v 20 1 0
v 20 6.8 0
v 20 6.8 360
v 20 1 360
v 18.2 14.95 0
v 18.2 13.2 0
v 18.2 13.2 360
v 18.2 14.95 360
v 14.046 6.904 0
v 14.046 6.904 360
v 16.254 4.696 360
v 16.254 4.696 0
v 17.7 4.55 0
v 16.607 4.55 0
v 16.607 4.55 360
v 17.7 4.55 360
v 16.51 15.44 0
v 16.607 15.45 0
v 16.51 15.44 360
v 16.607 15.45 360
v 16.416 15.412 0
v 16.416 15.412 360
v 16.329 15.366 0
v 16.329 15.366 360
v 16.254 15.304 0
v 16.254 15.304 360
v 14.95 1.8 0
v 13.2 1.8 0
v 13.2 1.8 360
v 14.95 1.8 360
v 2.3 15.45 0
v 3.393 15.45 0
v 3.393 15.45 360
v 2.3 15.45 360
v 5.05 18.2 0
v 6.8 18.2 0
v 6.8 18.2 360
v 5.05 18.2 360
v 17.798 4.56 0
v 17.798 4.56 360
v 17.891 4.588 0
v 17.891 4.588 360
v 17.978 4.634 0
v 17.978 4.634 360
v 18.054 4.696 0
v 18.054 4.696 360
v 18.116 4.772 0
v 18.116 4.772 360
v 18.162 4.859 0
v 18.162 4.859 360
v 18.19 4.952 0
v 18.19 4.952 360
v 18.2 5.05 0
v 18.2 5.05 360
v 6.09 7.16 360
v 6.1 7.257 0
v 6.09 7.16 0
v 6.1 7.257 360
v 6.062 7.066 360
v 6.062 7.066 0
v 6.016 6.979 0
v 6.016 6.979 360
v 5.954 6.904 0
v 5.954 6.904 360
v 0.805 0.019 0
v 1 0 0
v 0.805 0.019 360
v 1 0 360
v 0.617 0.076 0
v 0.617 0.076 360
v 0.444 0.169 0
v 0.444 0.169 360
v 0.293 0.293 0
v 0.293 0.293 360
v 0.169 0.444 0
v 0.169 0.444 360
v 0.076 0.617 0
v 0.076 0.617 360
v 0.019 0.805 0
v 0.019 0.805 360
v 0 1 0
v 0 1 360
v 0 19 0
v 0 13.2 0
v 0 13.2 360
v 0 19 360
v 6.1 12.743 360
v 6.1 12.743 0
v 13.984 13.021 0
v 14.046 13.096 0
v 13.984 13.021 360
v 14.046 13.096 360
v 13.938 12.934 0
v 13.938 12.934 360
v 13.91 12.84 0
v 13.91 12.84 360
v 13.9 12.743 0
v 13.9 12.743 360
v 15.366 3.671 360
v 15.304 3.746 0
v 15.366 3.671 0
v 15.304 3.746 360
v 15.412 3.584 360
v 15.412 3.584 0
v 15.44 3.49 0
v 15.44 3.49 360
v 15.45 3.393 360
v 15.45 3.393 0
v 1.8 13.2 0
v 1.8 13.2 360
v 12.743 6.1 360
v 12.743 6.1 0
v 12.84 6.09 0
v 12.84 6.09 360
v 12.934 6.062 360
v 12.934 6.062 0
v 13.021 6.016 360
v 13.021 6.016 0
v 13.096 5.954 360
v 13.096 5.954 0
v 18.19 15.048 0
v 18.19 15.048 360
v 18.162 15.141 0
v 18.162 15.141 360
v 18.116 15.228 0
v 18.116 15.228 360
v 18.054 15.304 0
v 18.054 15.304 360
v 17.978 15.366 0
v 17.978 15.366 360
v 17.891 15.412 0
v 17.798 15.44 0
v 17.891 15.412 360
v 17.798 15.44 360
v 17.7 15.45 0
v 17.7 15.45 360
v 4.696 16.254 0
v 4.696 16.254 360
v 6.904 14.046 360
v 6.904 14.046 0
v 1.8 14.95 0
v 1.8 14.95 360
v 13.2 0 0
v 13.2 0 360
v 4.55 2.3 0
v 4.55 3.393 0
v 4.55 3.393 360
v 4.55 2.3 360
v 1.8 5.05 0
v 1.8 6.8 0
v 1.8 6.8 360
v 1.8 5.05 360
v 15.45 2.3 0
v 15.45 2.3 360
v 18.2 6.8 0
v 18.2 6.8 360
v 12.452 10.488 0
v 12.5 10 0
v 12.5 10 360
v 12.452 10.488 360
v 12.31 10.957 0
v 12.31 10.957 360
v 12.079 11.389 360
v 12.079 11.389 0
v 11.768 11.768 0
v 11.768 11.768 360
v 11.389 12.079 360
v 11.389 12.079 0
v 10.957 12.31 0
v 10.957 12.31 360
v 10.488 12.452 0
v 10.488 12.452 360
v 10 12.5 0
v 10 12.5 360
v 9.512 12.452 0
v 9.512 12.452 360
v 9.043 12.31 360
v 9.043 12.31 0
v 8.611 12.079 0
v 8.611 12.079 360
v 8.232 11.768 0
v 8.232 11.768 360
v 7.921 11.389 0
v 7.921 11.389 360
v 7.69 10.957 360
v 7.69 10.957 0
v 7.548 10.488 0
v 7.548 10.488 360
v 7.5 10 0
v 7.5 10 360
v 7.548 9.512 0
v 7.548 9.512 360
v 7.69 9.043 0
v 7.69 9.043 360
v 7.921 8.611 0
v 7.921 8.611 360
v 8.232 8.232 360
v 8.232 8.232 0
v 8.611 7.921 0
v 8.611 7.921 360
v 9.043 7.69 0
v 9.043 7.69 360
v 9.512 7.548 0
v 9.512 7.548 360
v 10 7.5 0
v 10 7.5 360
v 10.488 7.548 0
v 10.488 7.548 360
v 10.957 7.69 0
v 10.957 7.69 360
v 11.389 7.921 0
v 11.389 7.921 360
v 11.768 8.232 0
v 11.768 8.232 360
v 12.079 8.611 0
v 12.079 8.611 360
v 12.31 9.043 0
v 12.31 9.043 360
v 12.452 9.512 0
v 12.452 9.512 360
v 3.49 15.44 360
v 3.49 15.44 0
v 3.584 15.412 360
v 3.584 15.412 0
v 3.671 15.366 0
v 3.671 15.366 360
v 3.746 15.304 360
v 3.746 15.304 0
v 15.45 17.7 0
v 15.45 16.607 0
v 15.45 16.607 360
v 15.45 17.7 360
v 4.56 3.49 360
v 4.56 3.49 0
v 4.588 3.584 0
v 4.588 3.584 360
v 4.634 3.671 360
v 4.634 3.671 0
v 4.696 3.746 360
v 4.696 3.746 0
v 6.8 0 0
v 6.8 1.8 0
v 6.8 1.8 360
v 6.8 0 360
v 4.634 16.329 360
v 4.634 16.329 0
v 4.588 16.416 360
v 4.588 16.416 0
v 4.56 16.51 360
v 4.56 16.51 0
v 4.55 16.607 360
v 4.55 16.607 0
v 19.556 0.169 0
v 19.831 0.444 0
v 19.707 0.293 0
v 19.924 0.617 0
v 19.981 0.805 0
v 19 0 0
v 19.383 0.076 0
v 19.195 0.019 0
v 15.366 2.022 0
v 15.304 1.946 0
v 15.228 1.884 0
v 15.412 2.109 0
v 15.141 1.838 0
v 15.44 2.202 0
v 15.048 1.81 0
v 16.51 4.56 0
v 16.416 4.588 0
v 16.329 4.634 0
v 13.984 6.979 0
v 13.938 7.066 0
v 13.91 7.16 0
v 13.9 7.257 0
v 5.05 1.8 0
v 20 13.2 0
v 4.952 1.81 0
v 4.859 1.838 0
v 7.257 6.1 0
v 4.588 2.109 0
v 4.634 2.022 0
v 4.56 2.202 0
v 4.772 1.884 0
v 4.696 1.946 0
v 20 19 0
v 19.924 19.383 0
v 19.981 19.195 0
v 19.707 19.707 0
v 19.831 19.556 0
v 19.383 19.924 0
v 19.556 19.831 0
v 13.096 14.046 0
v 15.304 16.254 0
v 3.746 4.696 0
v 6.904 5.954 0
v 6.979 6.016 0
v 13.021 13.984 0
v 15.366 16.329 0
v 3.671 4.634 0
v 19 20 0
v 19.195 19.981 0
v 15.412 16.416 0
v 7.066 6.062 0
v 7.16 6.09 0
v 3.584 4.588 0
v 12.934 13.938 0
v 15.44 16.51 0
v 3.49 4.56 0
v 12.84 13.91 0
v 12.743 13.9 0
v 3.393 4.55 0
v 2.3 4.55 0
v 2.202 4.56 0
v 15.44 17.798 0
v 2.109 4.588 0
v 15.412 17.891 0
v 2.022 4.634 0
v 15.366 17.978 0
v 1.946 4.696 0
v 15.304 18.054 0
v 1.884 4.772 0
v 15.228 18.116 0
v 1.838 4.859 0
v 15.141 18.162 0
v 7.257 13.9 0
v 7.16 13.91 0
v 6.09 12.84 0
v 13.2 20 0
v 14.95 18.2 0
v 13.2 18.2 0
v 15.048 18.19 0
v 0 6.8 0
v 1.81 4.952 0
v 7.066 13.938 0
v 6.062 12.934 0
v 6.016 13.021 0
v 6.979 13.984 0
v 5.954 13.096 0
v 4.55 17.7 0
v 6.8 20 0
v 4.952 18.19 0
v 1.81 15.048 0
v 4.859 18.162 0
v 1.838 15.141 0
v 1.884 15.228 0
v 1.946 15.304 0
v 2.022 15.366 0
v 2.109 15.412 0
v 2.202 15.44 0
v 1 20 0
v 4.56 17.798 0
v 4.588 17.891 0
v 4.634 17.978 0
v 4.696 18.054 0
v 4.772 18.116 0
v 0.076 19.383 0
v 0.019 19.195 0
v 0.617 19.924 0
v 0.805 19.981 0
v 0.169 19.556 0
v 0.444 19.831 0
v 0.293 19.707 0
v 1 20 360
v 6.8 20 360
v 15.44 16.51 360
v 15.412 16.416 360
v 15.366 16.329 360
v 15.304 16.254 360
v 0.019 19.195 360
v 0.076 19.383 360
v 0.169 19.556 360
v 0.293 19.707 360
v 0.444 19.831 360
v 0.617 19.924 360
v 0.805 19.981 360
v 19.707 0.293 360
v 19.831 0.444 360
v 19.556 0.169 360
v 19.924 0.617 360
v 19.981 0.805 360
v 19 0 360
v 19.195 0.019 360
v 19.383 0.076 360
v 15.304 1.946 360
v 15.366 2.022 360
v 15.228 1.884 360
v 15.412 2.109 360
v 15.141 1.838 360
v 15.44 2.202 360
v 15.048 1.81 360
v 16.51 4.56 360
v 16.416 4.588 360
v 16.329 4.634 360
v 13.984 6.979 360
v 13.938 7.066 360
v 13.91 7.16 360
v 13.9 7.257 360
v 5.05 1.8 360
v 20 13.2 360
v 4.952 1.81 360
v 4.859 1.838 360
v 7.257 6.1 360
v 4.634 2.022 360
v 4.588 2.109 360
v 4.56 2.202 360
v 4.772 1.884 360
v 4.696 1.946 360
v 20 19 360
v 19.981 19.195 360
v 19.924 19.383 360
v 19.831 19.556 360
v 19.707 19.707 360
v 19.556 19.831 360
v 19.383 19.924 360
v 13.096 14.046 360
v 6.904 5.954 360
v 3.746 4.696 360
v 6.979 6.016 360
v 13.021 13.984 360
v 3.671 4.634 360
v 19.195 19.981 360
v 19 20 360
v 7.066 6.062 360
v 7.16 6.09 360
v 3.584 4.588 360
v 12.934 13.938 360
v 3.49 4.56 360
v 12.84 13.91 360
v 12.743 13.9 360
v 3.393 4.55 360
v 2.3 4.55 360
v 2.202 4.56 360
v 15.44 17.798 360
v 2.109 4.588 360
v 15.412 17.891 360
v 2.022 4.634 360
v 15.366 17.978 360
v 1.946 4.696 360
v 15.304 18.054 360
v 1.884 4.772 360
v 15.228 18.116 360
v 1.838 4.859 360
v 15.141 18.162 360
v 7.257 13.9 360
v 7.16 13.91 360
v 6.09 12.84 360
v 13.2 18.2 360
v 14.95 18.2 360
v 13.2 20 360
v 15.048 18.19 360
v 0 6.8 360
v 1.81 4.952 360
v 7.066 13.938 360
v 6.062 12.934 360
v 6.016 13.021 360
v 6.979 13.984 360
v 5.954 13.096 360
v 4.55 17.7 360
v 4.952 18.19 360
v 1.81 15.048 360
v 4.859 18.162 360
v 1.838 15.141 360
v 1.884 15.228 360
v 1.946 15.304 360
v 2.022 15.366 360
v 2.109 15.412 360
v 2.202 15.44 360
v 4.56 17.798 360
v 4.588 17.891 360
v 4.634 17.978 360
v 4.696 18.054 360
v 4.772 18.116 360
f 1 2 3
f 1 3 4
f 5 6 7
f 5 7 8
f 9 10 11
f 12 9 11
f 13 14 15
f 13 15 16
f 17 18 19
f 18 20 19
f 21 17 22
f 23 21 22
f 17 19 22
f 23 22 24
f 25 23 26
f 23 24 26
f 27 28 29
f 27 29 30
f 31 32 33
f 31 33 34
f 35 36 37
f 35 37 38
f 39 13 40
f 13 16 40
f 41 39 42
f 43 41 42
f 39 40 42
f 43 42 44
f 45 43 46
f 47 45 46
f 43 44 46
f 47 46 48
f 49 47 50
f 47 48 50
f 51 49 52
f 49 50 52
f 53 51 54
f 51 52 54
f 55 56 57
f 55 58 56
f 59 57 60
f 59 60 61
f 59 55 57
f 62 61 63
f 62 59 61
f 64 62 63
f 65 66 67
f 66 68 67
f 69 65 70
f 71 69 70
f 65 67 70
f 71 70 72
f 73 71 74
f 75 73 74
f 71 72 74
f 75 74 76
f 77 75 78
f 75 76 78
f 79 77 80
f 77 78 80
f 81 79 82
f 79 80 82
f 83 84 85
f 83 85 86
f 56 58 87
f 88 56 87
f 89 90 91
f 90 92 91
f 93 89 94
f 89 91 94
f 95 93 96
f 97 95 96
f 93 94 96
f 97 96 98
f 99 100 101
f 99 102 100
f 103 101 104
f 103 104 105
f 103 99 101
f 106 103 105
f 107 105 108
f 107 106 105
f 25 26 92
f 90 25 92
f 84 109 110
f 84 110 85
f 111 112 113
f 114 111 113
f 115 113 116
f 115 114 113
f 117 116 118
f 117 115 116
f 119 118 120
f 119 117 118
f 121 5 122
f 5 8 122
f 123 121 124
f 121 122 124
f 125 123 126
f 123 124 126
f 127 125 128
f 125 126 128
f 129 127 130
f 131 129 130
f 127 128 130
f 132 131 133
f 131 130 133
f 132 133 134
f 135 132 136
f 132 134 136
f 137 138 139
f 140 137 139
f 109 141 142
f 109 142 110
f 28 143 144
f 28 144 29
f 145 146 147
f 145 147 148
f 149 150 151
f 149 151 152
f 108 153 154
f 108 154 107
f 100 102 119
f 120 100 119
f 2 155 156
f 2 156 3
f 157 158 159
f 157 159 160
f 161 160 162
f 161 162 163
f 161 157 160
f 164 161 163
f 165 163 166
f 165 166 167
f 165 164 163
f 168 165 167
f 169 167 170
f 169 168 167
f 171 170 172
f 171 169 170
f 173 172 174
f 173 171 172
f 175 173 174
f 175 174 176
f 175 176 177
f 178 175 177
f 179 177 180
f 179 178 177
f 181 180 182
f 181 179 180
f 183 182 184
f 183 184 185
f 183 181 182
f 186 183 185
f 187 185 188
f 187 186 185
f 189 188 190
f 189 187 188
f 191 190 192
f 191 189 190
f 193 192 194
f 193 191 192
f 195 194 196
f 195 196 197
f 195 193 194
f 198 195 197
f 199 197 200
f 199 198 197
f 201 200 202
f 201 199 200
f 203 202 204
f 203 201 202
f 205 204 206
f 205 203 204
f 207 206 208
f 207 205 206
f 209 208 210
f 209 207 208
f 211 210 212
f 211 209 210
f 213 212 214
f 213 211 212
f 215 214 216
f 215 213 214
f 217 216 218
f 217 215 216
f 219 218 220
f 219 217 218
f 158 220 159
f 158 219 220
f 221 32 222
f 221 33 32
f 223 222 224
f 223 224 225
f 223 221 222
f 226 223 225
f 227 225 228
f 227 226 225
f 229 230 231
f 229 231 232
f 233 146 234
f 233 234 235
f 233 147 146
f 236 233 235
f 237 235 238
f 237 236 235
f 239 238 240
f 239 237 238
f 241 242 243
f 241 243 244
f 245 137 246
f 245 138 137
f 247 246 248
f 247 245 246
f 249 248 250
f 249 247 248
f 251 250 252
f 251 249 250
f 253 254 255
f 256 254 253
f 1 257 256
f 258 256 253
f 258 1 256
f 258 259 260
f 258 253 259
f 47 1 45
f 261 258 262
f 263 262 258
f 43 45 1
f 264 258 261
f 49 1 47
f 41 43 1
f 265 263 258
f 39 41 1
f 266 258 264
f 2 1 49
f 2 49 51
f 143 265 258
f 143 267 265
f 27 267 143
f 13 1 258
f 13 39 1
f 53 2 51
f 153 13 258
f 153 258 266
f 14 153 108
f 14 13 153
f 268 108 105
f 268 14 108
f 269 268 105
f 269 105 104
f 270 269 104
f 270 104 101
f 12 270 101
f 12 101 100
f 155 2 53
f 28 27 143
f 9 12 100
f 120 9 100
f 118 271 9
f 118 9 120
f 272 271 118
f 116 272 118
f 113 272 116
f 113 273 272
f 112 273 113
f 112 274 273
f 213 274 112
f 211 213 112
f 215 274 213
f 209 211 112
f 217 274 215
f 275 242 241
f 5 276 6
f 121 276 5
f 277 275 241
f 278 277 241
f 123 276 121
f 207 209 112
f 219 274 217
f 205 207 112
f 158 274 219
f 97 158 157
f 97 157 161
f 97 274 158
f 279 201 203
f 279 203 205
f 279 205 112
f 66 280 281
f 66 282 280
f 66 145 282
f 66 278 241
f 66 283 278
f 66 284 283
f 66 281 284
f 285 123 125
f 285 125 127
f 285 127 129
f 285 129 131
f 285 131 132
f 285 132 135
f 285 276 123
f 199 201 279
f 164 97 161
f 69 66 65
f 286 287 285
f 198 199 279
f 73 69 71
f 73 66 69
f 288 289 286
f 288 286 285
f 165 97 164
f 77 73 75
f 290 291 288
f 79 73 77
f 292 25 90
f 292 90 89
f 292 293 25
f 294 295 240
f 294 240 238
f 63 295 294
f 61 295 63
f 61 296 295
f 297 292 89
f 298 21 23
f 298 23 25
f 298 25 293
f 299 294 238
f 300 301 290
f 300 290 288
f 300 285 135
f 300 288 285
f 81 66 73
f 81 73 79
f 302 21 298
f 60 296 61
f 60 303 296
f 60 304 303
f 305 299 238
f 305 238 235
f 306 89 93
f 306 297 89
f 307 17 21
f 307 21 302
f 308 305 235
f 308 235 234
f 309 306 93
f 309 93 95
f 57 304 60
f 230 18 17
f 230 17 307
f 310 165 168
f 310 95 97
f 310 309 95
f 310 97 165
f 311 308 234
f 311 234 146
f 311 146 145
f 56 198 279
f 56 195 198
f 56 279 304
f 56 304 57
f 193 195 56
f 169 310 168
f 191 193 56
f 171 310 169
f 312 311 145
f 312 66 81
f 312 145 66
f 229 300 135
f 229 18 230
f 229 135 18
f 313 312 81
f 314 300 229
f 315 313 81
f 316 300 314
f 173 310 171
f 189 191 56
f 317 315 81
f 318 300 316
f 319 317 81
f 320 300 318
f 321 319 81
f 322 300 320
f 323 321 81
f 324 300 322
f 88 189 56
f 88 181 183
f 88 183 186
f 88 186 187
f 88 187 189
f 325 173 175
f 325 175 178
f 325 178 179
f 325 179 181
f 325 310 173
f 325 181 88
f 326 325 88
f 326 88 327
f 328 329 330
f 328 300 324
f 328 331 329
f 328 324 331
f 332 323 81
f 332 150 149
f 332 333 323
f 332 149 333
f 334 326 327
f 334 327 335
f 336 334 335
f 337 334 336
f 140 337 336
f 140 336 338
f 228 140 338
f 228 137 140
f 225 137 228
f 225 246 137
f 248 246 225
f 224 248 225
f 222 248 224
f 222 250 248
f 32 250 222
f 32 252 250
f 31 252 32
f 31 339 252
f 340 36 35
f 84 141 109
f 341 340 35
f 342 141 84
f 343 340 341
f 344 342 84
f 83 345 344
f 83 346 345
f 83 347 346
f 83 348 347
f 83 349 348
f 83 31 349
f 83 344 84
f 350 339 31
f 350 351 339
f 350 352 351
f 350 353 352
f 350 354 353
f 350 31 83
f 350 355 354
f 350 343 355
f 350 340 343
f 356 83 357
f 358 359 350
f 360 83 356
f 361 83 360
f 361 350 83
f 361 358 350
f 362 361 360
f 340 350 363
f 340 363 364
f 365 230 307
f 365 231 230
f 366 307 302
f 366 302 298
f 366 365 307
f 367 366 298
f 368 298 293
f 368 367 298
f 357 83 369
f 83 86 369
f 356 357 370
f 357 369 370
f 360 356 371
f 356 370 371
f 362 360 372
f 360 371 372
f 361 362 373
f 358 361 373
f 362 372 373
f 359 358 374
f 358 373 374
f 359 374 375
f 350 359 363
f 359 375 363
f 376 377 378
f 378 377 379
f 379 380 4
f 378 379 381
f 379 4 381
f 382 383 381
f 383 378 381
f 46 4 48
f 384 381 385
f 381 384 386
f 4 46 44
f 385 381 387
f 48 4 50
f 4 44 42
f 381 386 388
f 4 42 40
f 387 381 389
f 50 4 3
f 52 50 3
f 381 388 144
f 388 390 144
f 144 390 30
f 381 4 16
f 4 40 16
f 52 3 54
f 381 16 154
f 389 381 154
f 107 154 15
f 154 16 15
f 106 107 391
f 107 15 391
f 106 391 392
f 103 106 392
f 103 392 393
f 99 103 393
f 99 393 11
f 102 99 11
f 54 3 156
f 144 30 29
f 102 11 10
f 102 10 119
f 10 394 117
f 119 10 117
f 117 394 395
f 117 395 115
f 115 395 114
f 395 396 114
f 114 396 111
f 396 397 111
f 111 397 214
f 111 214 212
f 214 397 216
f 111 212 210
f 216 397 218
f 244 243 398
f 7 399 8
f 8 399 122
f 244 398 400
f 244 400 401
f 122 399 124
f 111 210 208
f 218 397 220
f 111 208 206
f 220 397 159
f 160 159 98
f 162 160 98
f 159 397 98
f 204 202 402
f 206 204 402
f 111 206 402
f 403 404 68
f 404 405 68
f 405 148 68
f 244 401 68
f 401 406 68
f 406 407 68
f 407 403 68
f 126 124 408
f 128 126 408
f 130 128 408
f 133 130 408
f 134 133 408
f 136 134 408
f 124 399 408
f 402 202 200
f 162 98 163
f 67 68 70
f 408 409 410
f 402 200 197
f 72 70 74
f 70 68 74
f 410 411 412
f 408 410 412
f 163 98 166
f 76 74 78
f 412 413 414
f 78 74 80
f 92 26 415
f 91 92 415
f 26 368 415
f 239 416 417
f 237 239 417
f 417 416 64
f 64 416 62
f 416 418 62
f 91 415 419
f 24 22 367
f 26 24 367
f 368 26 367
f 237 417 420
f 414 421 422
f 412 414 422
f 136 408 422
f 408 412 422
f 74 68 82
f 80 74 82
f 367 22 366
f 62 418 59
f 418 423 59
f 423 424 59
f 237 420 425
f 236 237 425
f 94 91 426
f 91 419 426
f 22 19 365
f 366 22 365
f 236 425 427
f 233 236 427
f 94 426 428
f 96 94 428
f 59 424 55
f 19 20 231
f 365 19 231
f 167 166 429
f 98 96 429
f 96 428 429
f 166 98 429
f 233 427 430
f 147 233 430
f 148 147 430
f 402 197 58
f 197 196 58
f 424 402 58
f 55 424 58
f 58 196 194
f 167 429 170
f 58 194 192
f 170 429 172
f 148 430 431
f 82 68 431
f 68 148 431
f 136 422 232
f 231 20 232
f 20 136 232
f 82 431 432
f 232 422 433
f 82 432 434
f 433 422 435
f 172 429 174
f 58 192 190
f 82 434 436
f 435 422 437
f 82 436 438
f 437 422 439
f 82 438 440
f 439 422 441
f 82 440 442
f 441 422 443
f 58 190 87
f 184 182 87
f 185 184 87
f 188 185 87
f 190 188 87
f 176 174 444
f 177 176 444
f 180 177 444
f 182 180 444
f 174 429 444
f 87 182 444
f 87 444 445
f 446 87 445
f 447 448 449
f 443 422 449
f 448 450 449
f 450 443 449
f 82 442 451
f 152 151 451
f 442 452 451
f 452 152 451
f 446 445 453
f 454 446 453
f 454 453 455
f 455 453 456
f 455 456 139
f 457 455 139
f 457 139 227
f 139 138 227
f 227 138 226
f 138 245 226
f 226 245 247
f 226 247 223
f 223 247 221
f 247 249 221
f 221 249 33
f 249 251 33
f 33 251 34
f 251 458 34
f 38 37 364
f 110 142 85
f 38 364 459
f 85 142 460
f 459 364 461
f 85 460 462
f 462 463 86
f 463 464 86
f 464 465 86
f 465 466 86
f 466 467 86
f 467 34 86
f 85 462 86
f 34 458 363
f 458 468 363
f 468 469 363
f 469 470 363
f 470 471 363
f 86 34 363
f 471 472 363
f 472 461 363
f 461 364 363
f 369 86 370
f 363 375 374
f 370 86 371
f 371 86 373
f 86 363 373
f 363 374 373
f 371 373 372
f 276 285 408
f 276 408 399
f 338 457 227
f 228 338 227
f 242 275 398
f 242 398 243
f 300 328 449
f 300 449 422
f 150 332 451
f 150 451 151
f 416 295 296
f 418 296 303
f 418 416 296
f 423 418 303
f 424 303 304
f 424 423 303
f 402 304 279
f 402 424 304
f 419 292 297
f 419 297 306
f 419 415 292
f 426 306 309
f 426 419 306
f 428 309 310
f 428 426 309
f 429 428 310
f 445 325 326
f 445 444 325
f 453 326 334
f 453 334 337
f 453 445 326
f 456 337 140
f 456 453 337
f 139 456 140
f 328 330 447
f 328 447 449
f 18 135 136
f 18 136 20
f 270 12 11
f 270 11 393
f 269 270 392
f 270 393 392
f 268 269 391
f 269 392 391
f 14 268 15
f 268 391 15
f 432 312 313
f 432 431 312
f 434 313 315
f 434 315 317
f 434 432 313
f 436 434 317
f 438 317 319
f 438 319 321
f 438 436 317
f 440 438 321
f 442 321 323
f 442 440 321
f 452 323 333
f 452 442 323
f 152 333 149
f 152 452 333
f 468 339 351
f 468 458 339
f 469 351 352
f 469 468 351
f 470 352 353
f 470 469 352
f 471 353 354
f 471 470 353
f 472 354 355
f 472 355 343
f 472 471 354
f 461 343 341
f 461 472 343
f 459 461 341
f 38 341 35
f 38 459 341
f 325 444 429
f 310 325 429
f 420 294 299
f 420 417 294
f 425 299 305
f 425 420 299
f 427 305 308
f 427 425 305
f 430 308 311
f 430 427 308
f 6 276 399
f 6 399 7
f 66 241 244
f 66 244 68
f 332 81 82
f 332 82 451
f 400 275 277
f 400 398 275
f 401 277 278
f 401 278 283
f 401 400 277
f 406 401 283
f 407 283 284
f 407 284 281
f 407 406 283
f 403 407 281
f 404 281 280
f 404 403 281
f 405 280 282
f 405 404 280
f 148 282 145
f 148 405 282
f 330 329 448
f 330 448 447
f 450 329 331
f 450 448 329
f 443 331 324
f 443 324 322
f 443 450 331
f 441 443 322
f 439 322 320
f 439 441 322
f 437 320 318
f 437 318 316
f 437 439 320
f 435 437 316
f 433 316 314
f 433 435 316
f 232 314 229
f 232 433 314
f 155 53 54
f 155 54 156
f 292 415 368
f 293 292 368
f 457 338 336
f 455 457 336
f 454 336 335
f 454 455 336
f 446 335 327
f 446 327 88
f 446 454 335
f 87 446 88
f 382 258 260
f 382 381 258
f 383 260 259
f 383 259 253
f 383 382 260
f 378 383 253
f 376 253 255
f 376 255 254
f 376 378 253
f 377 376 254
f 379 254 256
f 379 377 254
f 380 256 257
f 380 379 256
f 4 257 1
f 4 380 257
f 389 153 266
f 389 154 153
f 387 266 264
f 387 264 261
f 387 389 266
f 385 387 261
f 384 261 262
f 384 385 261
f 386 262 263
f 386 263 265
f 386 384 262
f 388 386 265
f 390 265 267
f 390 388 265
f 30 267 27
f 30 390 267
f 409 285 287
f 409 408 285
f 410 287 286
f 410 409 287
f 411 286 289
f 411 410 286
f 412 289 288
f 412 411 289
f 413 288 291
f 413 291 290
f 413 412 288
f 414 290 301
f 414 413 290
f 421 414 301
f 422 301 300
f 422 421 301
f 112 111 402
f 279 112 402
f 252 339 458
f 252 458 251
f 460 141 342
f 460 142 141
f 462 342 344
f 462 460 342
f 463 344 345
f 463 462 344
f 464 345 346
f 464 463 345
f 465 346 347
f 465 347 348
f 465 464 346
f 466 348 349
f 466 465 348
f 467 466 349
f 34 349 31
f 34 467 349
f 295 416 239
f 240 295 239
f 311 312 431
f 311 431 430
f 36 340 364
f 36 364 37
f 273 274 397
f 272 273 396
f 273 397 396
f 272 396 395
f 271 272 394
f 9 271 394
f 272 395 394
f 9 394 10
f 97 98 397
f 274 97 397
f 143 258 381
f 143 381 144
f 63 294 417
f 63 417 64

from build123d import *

# Parameters (mm, degrees)
SKETCH1_R           = 2.5
BOSS_EXTRUDE1_DEPTH = 360
FILLET1_R           = 1
FILLET2_R           = 0.5
FILLET3_R           = 0.5
FILLET4_R           = 0.5
FILLET5_R           = 0.5


with BuildPart() as part:
    # Sketch1 → Boss-Extrude1 (new body)
    with BuildSketch(Plane.XY):
        Polygon((13.2, 0), (13.2, 1.8), (15.45, 1.8), (15.45, 3.6), (12.95, 6.1), (7.05, 6.1), (4.55, 3.6), (4.55, 1.8), (6.8, 1.8), (6.8, 0), (0, 0), (0, 6.8), (1.8, 6.8), (1.8, 4.55), (3.6, 4.55), (6.1, 7.05), (6.1, 12.95), (3.6, 15.45), (1.8, 15.45), (1.8, 13.2), (0, 13.2), (0, 20), (6.8, 20), (6.8, 18.2), (4.55, 18.2), (4.55, 16.4), (7.05, 13.9), (12.95, 13.9), (15.45, 16.4), (15.45, 18.2), (13.2, 18.2), (13.2, 20), (20, 20), (20, 13.2), (18.2, 13.2), (18.2, 15.45), (16.4, 15.45), (13.9, 12.95), (13.9, 7.05), (16.4, 4.55), (18.2, 4.55), (18.2, 6.8), (20, 6.8), (20, 0), align=None)
        with Locations((10, 10)):
            Circle(SKETCH1_R, mode=Mode.SUBTRACT)
    extrude(amount=BOSS_EXTRUDE1_DEPTH)

    # Fillet1
    fillet1_edges = [part.edges().sort_by_distance(p)[0] for p in [
        (0, 0, 180),
        (0, 20, 180),
        (20, 20, 180),
        (20, 0, 180),
    ]]
    fillet(fillet1_edges, radius=FILLET1_R)

    # Fillet2
    fillet2_edges = [part.edges().sort_by_distance(p)[0] for p in [
        (4.55, 18.2, 180),
        (4.55, 16.4, 180),
        (7.05, 13.9, 180),
        (12.95, 13.9, 180),
        (15.45, 16.4, 180),
        (15.45, 18.2, 180),
    ]]
    fillet(fillet2_edges, radius=FILLET2_R)

    # Fillet3
    fillet3_edges = [part.edges().sort_by_distance(p)[0] for p in [
        (18.2, 15.45, 180),
        (16.4, 15.45, 180),
        (13.9, 12.95, 180),
        (13.9, 7.05, 180),
        (16.4, 4.55, 180),
        (18.2, 4.55, 180),
    ]]
    fillet(fillet3_edges, radius=FILLET3_R)

    # Fillet4
    fillet4_edges = [part.edges().sort_by_distance(p)[0] for p in [
        (1.8, 4.55, 180),
        (3.6, 4.55, 180),
        (6.1, 7.05, 180),
        (6.1, 12.95, 180),
        (3.6, 15.45, 180),
        (1.8, 15.45, 180),
    ]]
    fillet(fillet4_edges, radius=FILLET4_R)

    # Fillet5
    fillet5_edges = [part.edges().sort_by_distance(p)[0] for p in [
        (15.45, 1.8, 180),
        (15.45, 3.6, 180),
        (12.95, 6.1, 180),
        (7.05, 6.1, 180),
        (4.55, 3.6, 180),
        (4.55, 1.8, 180),
    ]]
    fillet(fillet5_edges, radius=FILLET5_R)


solid = part.part
